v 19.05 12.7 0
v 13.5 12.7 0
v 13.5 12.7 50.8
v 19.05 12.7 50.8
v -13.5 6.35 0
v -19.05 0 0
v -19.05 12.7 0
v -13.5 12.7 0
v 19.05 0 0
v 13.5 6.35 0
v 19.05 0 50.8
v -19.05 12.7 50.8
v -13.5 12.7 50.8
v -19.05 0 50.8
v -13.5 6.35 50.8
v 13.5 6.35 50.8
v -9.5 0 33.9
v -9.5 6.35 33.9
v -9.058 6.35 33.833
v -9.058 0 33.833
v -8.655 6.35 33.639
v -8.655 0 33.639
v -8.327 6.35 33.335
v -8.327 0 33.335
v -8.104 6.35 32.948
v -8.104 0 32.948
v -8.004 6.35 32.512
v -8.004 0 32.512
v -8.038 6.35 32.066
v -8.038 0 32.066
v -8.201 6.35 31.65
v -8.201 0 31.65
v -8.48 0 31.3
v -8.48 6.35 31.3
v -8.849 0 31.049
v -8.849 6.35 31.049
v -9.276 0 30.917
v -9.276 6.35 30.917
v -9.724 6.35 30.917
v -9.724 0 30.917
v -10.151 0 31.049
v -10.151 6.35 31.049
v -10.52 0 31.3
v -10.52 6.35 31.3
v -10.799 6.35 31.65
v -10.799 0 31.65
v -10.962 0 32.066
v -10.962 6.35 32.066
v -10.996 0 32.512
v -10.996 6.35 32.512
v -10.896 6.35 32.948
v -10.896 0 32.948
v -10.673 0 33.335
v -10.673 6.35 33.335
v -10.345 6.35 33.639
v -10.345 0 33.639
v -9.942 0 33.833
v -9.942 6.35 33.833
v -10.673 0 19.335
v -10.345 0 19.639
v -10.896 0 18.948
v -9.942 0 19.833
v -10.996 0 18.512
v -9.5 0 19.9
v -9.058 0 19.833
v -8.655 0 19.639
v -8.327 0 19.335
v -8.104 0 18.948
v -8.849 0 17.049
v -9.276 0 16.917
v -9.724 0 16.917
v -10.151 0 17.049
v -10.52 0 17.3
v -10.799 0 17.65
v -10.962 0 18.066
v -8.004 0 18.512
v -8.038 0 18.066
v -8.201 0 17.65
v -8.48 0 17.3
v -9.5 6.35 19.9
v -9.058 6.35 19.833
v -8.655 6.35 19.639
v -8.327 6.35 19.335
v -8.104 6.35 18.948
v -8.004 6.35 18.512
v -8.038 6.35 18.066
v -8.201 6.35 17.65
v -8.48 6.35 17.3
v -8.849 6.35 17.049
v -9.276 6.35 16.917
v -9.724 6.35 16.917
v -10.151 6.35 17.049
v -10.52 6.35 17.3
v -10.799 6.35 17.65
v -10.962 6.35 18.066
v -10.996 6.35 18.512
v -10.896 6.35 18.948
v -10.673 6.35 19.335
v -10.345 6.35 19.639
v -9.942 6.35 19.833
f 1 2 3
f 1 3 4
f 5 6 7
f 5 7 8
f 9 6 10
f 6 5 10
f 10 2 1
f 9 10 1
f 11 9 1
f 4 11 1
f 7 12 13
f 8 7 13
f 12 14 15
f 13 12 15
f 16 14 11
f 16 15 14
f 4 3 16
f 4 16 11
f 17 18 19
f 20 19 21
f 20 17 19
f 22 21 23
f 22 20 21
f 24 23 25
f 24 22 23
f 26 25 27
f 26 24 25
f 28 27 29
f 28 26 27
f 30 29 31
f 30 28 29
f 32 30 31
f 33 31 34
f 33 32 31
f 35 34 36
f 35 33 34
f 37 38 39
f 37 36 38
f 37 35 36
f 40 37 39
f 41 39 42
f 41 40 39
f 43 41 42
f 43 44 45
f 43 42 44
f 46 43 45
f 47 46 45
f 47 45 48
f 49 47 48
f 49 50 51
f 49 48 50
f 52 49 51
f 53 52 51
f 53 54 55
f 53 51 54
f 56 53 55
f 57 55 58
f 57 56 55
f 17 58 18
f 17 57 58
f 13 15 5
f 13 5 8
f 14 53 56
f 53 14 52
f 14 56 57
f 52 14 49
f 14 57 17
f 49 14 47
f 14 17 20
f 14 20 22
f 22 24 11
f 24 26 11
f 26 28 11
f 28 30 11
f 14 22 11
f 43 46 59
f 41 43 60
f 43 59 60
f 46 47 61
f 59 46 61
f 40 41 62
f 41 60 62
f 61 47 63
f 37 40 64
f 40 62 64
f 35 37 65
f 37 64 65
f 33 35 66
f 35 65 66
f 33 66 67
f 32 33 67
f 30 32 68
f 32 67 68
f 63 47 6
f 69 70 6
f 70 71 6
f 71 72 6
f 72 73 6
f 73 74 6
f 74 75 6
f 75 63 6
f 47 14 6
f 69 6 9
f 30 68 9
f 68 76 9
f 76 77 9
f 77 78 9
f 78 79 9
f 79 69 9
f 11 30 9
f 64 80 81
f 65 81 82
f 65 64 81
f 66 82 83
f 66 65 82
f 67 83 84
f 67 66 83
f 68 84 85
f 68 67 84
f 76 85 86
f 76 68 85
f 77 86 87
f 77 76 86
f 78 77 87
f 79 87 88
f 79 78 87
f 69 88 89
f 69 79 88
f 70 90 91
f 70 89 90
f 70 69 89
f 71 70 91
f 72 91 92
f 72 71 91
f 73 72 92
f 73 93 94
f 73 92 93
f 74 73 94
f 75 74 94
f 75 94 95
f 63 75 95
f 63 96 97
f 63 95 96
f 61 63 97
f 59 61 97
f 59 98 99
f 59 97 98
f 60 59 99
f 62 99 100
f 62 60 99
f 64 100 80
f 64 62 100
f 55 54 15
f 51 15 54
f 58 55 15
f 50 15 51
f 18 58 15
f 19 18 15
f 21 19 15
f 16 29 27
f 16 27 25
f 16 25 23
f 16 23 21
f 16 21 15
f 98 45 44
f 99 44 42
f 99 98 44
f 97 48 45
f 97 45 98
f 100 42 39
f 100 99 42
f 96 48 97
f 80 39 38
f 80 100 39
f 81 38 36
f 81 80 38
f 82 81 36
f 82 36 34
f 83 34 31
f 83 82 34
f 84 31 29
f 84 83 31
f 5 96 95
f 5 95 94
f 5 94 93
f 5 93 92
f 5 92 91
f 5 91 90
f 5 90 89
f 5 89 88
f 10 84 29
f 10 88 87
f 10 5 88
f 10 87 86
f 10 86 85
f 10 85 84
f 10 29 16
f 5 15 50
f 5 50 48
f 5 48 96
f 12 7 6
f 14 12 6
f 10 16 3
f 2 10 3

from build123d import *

# Parameters (mm, degrees)
SKETCH1_W           = 5.55
SKETCH1_H           = 6.35
SKETCH1_W_2         = 27
BOSS_EXTRUDE1_DEPTH = 50.8
SKETCH2_R           = 1.5
CUT_EXTRUDE1_DEPTH  = 56.72102386


with BuildPart() as part:
    # Sketch1 → Boss-Extrude1 (new body)
    with BuildSketch(Plane.XY):
        with Locations((-16.275, 9.525)):
            Rectangle(SKETCH1_W, SKETCH1_H)
        with Locations((-16.275, 3.175)):
            Rectangle(SKETCH1_W, SKETCH1_H)
        with Locations((0, 3.175)):
            Rectangle(SKETCH1_W_2, SKETCH1_H)
        with Locations((16.275, 9.525)):
            Rectangle(SKETCH1_W, SKETCH1_H)
        with Locations((16.275, 3.175)):
            Rectangle(SKETCH1_W, SKETCH1_H)
    extrude(amount=BOSS_EXTRUDE1_DEPTH)

    # Sketch2 → Cut-Extrude1 (cut, through all)
    with BuildSketch(Plane(origin=(0, 0, 0), x_dir=(1, 0, 0), z_dir=(0, 1, 0))):
        with Locations(Location((-9.5, -32.4, 0), (0, 0, 270))):
            Circle(SKETCH2_R)
        with Locations(Location((-9.5, -18.4, 0), (0, 0, 270))):
            Circle(SKETCH2_R)
    extrude(amount=CUT_EXTRUDE1_DEPTH, mode=Mode.SUBTRACT)


solid = part.part
